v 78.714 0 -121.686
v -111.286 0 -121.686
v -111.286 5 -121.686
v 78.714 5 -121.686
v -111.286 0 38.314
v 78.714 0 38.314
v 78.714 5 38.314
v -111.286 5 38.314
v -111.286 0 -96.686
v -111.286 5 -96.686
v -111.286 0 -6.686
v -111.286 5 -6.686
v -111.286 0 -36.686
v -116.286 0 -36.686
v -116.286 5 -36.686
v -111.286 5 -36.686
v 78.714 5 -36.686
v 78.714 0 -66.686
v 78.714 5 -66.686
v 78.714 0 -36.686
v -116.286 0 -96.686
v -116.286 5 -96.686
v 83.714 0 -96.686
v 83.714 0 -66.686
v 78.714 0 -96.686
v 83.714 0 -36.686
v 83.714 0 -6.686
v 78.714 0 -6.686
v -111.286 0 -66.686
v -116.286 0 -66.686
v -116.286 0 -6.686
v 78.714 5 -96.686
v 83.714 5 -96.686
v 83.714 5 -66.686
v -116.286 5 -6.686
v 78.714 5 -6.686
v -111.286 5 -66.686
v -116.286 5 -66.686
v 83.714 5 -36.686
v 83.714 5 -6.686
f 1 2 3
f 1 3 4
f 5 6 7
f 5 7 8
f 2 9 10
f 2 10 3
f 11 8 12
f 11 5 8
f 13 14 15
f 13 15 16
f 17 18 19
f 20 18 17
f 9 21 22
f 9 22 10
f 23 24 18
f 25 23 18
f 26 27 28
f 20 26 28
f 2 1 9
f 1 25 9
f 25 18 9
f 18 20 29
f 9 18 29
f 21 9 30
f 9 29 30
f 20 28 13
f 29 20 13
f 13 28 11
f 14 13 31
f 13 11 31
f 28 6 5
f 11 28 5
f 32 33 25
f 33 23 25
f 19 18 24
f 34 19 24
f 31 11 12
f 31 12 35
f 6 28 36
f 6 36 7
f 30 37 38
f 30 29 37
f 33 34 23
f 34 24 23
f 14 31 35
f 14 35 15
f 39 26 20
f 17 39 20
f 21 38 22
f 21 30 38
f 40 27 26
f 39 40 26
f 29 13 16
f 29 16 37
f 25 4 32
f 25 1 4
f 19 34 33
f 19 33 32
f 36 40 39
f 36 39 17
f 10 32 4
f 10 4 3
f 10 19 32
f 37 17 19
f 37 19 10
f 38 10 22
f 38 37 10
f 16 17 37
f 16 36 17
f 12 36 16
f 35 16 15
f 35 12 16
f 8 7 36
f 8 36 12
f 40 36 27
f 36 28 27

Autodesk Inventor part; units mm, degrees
ref_plane "YZ Plane" through (0, 0, 0) normal (1, 0, 0) x (0, 1, 0)
ref_plane "XZ Plane" through (0, 0, 0) normal (0, 1, 0) x (-1, 0, 0)
ref_plane "XY Plane" through (0, 0, 0) normal (0, 0, 1) x (1, 0, 0)
sketch "Sketch1" plane through (0, 0, 0) normal (0, 1, 0) x (-1, 0, 0)
  line L0 (-78.7139, 38.3135) -> (111.2861, 38.3135)
  line L1 (111.2861, 38.3135) -> (111.2861, -121.6865)
  line L2 (111.2861, -121.6865) -> (-78.7139, -121.6865)
  line L3 (-78.7139, -121.6865) -> (-78.7139, 38.3135)
  line L4 (111.2861, -6.6865) -> (116.2861, -6.6865)
  line L5 (116.2861, -6.6865) -> (116.2861, -36.6865)
  line L6 (116.2861, -36.6865) -> (111.2861, -36.6865)
  line L7 (111.2861, -36.6865) -> (111.2861, -6.6865)
  line L8 (111.2861, -66.6865) -> (116.2861, -66.6865)
  line L9 (116.2861, -66.6865) -> (116.2861, -96.6865)
  line L10 (116.2861, -96.6865) -> (111.2861, -96.6865)
  line L11 (111.2861, -96.6865) -> (111.2861, -66.6865)
  line L12 (111.2861, -41.6865) -> (-78.7139, -41.6865) construction
  line L13 (16.2861, 38.3135) -> (16.2861, -121.6865) construction
  line L14 (-78.7139, -6.6865) -> (-83.7139, -6.6865)
  line L15 (-83.7139, -6.6865) -> (-83.7139, -36.6865)
  line L16 (-83.7139, -36.6865) -> (-78.7139, -36.6865)
  line L17 (-78.7139, -66.6865) -> (-83.7139, -66.6865)
  line L18 (-83.7139, -66.6865) -> (-83.7139, -96.6865)
  line L19 (-83.7139, -96.6865) -> (-78.7139, -96.6865)
  line L20 (-78.7139, -41.6865) -> (111.2861, -41.6865) construction
  point P0 (0, 0)
  point P1 (-78.7139, -66.6865)
  point P2 (-78.7139, -96.6865)
  dimension "d0" = 190
  dimension "d1" = 160
  dimension "d2" = 5
  dimension "d3" = 30
  dimension "d4" = 5
  dimension "d5" = 30
  dimension "d6" = 30
  dimension "d7" = 5
extrude "Extrusion1" add sketch "Sketch1" along normal blind 5
properties part number "Tapa diagonal"
